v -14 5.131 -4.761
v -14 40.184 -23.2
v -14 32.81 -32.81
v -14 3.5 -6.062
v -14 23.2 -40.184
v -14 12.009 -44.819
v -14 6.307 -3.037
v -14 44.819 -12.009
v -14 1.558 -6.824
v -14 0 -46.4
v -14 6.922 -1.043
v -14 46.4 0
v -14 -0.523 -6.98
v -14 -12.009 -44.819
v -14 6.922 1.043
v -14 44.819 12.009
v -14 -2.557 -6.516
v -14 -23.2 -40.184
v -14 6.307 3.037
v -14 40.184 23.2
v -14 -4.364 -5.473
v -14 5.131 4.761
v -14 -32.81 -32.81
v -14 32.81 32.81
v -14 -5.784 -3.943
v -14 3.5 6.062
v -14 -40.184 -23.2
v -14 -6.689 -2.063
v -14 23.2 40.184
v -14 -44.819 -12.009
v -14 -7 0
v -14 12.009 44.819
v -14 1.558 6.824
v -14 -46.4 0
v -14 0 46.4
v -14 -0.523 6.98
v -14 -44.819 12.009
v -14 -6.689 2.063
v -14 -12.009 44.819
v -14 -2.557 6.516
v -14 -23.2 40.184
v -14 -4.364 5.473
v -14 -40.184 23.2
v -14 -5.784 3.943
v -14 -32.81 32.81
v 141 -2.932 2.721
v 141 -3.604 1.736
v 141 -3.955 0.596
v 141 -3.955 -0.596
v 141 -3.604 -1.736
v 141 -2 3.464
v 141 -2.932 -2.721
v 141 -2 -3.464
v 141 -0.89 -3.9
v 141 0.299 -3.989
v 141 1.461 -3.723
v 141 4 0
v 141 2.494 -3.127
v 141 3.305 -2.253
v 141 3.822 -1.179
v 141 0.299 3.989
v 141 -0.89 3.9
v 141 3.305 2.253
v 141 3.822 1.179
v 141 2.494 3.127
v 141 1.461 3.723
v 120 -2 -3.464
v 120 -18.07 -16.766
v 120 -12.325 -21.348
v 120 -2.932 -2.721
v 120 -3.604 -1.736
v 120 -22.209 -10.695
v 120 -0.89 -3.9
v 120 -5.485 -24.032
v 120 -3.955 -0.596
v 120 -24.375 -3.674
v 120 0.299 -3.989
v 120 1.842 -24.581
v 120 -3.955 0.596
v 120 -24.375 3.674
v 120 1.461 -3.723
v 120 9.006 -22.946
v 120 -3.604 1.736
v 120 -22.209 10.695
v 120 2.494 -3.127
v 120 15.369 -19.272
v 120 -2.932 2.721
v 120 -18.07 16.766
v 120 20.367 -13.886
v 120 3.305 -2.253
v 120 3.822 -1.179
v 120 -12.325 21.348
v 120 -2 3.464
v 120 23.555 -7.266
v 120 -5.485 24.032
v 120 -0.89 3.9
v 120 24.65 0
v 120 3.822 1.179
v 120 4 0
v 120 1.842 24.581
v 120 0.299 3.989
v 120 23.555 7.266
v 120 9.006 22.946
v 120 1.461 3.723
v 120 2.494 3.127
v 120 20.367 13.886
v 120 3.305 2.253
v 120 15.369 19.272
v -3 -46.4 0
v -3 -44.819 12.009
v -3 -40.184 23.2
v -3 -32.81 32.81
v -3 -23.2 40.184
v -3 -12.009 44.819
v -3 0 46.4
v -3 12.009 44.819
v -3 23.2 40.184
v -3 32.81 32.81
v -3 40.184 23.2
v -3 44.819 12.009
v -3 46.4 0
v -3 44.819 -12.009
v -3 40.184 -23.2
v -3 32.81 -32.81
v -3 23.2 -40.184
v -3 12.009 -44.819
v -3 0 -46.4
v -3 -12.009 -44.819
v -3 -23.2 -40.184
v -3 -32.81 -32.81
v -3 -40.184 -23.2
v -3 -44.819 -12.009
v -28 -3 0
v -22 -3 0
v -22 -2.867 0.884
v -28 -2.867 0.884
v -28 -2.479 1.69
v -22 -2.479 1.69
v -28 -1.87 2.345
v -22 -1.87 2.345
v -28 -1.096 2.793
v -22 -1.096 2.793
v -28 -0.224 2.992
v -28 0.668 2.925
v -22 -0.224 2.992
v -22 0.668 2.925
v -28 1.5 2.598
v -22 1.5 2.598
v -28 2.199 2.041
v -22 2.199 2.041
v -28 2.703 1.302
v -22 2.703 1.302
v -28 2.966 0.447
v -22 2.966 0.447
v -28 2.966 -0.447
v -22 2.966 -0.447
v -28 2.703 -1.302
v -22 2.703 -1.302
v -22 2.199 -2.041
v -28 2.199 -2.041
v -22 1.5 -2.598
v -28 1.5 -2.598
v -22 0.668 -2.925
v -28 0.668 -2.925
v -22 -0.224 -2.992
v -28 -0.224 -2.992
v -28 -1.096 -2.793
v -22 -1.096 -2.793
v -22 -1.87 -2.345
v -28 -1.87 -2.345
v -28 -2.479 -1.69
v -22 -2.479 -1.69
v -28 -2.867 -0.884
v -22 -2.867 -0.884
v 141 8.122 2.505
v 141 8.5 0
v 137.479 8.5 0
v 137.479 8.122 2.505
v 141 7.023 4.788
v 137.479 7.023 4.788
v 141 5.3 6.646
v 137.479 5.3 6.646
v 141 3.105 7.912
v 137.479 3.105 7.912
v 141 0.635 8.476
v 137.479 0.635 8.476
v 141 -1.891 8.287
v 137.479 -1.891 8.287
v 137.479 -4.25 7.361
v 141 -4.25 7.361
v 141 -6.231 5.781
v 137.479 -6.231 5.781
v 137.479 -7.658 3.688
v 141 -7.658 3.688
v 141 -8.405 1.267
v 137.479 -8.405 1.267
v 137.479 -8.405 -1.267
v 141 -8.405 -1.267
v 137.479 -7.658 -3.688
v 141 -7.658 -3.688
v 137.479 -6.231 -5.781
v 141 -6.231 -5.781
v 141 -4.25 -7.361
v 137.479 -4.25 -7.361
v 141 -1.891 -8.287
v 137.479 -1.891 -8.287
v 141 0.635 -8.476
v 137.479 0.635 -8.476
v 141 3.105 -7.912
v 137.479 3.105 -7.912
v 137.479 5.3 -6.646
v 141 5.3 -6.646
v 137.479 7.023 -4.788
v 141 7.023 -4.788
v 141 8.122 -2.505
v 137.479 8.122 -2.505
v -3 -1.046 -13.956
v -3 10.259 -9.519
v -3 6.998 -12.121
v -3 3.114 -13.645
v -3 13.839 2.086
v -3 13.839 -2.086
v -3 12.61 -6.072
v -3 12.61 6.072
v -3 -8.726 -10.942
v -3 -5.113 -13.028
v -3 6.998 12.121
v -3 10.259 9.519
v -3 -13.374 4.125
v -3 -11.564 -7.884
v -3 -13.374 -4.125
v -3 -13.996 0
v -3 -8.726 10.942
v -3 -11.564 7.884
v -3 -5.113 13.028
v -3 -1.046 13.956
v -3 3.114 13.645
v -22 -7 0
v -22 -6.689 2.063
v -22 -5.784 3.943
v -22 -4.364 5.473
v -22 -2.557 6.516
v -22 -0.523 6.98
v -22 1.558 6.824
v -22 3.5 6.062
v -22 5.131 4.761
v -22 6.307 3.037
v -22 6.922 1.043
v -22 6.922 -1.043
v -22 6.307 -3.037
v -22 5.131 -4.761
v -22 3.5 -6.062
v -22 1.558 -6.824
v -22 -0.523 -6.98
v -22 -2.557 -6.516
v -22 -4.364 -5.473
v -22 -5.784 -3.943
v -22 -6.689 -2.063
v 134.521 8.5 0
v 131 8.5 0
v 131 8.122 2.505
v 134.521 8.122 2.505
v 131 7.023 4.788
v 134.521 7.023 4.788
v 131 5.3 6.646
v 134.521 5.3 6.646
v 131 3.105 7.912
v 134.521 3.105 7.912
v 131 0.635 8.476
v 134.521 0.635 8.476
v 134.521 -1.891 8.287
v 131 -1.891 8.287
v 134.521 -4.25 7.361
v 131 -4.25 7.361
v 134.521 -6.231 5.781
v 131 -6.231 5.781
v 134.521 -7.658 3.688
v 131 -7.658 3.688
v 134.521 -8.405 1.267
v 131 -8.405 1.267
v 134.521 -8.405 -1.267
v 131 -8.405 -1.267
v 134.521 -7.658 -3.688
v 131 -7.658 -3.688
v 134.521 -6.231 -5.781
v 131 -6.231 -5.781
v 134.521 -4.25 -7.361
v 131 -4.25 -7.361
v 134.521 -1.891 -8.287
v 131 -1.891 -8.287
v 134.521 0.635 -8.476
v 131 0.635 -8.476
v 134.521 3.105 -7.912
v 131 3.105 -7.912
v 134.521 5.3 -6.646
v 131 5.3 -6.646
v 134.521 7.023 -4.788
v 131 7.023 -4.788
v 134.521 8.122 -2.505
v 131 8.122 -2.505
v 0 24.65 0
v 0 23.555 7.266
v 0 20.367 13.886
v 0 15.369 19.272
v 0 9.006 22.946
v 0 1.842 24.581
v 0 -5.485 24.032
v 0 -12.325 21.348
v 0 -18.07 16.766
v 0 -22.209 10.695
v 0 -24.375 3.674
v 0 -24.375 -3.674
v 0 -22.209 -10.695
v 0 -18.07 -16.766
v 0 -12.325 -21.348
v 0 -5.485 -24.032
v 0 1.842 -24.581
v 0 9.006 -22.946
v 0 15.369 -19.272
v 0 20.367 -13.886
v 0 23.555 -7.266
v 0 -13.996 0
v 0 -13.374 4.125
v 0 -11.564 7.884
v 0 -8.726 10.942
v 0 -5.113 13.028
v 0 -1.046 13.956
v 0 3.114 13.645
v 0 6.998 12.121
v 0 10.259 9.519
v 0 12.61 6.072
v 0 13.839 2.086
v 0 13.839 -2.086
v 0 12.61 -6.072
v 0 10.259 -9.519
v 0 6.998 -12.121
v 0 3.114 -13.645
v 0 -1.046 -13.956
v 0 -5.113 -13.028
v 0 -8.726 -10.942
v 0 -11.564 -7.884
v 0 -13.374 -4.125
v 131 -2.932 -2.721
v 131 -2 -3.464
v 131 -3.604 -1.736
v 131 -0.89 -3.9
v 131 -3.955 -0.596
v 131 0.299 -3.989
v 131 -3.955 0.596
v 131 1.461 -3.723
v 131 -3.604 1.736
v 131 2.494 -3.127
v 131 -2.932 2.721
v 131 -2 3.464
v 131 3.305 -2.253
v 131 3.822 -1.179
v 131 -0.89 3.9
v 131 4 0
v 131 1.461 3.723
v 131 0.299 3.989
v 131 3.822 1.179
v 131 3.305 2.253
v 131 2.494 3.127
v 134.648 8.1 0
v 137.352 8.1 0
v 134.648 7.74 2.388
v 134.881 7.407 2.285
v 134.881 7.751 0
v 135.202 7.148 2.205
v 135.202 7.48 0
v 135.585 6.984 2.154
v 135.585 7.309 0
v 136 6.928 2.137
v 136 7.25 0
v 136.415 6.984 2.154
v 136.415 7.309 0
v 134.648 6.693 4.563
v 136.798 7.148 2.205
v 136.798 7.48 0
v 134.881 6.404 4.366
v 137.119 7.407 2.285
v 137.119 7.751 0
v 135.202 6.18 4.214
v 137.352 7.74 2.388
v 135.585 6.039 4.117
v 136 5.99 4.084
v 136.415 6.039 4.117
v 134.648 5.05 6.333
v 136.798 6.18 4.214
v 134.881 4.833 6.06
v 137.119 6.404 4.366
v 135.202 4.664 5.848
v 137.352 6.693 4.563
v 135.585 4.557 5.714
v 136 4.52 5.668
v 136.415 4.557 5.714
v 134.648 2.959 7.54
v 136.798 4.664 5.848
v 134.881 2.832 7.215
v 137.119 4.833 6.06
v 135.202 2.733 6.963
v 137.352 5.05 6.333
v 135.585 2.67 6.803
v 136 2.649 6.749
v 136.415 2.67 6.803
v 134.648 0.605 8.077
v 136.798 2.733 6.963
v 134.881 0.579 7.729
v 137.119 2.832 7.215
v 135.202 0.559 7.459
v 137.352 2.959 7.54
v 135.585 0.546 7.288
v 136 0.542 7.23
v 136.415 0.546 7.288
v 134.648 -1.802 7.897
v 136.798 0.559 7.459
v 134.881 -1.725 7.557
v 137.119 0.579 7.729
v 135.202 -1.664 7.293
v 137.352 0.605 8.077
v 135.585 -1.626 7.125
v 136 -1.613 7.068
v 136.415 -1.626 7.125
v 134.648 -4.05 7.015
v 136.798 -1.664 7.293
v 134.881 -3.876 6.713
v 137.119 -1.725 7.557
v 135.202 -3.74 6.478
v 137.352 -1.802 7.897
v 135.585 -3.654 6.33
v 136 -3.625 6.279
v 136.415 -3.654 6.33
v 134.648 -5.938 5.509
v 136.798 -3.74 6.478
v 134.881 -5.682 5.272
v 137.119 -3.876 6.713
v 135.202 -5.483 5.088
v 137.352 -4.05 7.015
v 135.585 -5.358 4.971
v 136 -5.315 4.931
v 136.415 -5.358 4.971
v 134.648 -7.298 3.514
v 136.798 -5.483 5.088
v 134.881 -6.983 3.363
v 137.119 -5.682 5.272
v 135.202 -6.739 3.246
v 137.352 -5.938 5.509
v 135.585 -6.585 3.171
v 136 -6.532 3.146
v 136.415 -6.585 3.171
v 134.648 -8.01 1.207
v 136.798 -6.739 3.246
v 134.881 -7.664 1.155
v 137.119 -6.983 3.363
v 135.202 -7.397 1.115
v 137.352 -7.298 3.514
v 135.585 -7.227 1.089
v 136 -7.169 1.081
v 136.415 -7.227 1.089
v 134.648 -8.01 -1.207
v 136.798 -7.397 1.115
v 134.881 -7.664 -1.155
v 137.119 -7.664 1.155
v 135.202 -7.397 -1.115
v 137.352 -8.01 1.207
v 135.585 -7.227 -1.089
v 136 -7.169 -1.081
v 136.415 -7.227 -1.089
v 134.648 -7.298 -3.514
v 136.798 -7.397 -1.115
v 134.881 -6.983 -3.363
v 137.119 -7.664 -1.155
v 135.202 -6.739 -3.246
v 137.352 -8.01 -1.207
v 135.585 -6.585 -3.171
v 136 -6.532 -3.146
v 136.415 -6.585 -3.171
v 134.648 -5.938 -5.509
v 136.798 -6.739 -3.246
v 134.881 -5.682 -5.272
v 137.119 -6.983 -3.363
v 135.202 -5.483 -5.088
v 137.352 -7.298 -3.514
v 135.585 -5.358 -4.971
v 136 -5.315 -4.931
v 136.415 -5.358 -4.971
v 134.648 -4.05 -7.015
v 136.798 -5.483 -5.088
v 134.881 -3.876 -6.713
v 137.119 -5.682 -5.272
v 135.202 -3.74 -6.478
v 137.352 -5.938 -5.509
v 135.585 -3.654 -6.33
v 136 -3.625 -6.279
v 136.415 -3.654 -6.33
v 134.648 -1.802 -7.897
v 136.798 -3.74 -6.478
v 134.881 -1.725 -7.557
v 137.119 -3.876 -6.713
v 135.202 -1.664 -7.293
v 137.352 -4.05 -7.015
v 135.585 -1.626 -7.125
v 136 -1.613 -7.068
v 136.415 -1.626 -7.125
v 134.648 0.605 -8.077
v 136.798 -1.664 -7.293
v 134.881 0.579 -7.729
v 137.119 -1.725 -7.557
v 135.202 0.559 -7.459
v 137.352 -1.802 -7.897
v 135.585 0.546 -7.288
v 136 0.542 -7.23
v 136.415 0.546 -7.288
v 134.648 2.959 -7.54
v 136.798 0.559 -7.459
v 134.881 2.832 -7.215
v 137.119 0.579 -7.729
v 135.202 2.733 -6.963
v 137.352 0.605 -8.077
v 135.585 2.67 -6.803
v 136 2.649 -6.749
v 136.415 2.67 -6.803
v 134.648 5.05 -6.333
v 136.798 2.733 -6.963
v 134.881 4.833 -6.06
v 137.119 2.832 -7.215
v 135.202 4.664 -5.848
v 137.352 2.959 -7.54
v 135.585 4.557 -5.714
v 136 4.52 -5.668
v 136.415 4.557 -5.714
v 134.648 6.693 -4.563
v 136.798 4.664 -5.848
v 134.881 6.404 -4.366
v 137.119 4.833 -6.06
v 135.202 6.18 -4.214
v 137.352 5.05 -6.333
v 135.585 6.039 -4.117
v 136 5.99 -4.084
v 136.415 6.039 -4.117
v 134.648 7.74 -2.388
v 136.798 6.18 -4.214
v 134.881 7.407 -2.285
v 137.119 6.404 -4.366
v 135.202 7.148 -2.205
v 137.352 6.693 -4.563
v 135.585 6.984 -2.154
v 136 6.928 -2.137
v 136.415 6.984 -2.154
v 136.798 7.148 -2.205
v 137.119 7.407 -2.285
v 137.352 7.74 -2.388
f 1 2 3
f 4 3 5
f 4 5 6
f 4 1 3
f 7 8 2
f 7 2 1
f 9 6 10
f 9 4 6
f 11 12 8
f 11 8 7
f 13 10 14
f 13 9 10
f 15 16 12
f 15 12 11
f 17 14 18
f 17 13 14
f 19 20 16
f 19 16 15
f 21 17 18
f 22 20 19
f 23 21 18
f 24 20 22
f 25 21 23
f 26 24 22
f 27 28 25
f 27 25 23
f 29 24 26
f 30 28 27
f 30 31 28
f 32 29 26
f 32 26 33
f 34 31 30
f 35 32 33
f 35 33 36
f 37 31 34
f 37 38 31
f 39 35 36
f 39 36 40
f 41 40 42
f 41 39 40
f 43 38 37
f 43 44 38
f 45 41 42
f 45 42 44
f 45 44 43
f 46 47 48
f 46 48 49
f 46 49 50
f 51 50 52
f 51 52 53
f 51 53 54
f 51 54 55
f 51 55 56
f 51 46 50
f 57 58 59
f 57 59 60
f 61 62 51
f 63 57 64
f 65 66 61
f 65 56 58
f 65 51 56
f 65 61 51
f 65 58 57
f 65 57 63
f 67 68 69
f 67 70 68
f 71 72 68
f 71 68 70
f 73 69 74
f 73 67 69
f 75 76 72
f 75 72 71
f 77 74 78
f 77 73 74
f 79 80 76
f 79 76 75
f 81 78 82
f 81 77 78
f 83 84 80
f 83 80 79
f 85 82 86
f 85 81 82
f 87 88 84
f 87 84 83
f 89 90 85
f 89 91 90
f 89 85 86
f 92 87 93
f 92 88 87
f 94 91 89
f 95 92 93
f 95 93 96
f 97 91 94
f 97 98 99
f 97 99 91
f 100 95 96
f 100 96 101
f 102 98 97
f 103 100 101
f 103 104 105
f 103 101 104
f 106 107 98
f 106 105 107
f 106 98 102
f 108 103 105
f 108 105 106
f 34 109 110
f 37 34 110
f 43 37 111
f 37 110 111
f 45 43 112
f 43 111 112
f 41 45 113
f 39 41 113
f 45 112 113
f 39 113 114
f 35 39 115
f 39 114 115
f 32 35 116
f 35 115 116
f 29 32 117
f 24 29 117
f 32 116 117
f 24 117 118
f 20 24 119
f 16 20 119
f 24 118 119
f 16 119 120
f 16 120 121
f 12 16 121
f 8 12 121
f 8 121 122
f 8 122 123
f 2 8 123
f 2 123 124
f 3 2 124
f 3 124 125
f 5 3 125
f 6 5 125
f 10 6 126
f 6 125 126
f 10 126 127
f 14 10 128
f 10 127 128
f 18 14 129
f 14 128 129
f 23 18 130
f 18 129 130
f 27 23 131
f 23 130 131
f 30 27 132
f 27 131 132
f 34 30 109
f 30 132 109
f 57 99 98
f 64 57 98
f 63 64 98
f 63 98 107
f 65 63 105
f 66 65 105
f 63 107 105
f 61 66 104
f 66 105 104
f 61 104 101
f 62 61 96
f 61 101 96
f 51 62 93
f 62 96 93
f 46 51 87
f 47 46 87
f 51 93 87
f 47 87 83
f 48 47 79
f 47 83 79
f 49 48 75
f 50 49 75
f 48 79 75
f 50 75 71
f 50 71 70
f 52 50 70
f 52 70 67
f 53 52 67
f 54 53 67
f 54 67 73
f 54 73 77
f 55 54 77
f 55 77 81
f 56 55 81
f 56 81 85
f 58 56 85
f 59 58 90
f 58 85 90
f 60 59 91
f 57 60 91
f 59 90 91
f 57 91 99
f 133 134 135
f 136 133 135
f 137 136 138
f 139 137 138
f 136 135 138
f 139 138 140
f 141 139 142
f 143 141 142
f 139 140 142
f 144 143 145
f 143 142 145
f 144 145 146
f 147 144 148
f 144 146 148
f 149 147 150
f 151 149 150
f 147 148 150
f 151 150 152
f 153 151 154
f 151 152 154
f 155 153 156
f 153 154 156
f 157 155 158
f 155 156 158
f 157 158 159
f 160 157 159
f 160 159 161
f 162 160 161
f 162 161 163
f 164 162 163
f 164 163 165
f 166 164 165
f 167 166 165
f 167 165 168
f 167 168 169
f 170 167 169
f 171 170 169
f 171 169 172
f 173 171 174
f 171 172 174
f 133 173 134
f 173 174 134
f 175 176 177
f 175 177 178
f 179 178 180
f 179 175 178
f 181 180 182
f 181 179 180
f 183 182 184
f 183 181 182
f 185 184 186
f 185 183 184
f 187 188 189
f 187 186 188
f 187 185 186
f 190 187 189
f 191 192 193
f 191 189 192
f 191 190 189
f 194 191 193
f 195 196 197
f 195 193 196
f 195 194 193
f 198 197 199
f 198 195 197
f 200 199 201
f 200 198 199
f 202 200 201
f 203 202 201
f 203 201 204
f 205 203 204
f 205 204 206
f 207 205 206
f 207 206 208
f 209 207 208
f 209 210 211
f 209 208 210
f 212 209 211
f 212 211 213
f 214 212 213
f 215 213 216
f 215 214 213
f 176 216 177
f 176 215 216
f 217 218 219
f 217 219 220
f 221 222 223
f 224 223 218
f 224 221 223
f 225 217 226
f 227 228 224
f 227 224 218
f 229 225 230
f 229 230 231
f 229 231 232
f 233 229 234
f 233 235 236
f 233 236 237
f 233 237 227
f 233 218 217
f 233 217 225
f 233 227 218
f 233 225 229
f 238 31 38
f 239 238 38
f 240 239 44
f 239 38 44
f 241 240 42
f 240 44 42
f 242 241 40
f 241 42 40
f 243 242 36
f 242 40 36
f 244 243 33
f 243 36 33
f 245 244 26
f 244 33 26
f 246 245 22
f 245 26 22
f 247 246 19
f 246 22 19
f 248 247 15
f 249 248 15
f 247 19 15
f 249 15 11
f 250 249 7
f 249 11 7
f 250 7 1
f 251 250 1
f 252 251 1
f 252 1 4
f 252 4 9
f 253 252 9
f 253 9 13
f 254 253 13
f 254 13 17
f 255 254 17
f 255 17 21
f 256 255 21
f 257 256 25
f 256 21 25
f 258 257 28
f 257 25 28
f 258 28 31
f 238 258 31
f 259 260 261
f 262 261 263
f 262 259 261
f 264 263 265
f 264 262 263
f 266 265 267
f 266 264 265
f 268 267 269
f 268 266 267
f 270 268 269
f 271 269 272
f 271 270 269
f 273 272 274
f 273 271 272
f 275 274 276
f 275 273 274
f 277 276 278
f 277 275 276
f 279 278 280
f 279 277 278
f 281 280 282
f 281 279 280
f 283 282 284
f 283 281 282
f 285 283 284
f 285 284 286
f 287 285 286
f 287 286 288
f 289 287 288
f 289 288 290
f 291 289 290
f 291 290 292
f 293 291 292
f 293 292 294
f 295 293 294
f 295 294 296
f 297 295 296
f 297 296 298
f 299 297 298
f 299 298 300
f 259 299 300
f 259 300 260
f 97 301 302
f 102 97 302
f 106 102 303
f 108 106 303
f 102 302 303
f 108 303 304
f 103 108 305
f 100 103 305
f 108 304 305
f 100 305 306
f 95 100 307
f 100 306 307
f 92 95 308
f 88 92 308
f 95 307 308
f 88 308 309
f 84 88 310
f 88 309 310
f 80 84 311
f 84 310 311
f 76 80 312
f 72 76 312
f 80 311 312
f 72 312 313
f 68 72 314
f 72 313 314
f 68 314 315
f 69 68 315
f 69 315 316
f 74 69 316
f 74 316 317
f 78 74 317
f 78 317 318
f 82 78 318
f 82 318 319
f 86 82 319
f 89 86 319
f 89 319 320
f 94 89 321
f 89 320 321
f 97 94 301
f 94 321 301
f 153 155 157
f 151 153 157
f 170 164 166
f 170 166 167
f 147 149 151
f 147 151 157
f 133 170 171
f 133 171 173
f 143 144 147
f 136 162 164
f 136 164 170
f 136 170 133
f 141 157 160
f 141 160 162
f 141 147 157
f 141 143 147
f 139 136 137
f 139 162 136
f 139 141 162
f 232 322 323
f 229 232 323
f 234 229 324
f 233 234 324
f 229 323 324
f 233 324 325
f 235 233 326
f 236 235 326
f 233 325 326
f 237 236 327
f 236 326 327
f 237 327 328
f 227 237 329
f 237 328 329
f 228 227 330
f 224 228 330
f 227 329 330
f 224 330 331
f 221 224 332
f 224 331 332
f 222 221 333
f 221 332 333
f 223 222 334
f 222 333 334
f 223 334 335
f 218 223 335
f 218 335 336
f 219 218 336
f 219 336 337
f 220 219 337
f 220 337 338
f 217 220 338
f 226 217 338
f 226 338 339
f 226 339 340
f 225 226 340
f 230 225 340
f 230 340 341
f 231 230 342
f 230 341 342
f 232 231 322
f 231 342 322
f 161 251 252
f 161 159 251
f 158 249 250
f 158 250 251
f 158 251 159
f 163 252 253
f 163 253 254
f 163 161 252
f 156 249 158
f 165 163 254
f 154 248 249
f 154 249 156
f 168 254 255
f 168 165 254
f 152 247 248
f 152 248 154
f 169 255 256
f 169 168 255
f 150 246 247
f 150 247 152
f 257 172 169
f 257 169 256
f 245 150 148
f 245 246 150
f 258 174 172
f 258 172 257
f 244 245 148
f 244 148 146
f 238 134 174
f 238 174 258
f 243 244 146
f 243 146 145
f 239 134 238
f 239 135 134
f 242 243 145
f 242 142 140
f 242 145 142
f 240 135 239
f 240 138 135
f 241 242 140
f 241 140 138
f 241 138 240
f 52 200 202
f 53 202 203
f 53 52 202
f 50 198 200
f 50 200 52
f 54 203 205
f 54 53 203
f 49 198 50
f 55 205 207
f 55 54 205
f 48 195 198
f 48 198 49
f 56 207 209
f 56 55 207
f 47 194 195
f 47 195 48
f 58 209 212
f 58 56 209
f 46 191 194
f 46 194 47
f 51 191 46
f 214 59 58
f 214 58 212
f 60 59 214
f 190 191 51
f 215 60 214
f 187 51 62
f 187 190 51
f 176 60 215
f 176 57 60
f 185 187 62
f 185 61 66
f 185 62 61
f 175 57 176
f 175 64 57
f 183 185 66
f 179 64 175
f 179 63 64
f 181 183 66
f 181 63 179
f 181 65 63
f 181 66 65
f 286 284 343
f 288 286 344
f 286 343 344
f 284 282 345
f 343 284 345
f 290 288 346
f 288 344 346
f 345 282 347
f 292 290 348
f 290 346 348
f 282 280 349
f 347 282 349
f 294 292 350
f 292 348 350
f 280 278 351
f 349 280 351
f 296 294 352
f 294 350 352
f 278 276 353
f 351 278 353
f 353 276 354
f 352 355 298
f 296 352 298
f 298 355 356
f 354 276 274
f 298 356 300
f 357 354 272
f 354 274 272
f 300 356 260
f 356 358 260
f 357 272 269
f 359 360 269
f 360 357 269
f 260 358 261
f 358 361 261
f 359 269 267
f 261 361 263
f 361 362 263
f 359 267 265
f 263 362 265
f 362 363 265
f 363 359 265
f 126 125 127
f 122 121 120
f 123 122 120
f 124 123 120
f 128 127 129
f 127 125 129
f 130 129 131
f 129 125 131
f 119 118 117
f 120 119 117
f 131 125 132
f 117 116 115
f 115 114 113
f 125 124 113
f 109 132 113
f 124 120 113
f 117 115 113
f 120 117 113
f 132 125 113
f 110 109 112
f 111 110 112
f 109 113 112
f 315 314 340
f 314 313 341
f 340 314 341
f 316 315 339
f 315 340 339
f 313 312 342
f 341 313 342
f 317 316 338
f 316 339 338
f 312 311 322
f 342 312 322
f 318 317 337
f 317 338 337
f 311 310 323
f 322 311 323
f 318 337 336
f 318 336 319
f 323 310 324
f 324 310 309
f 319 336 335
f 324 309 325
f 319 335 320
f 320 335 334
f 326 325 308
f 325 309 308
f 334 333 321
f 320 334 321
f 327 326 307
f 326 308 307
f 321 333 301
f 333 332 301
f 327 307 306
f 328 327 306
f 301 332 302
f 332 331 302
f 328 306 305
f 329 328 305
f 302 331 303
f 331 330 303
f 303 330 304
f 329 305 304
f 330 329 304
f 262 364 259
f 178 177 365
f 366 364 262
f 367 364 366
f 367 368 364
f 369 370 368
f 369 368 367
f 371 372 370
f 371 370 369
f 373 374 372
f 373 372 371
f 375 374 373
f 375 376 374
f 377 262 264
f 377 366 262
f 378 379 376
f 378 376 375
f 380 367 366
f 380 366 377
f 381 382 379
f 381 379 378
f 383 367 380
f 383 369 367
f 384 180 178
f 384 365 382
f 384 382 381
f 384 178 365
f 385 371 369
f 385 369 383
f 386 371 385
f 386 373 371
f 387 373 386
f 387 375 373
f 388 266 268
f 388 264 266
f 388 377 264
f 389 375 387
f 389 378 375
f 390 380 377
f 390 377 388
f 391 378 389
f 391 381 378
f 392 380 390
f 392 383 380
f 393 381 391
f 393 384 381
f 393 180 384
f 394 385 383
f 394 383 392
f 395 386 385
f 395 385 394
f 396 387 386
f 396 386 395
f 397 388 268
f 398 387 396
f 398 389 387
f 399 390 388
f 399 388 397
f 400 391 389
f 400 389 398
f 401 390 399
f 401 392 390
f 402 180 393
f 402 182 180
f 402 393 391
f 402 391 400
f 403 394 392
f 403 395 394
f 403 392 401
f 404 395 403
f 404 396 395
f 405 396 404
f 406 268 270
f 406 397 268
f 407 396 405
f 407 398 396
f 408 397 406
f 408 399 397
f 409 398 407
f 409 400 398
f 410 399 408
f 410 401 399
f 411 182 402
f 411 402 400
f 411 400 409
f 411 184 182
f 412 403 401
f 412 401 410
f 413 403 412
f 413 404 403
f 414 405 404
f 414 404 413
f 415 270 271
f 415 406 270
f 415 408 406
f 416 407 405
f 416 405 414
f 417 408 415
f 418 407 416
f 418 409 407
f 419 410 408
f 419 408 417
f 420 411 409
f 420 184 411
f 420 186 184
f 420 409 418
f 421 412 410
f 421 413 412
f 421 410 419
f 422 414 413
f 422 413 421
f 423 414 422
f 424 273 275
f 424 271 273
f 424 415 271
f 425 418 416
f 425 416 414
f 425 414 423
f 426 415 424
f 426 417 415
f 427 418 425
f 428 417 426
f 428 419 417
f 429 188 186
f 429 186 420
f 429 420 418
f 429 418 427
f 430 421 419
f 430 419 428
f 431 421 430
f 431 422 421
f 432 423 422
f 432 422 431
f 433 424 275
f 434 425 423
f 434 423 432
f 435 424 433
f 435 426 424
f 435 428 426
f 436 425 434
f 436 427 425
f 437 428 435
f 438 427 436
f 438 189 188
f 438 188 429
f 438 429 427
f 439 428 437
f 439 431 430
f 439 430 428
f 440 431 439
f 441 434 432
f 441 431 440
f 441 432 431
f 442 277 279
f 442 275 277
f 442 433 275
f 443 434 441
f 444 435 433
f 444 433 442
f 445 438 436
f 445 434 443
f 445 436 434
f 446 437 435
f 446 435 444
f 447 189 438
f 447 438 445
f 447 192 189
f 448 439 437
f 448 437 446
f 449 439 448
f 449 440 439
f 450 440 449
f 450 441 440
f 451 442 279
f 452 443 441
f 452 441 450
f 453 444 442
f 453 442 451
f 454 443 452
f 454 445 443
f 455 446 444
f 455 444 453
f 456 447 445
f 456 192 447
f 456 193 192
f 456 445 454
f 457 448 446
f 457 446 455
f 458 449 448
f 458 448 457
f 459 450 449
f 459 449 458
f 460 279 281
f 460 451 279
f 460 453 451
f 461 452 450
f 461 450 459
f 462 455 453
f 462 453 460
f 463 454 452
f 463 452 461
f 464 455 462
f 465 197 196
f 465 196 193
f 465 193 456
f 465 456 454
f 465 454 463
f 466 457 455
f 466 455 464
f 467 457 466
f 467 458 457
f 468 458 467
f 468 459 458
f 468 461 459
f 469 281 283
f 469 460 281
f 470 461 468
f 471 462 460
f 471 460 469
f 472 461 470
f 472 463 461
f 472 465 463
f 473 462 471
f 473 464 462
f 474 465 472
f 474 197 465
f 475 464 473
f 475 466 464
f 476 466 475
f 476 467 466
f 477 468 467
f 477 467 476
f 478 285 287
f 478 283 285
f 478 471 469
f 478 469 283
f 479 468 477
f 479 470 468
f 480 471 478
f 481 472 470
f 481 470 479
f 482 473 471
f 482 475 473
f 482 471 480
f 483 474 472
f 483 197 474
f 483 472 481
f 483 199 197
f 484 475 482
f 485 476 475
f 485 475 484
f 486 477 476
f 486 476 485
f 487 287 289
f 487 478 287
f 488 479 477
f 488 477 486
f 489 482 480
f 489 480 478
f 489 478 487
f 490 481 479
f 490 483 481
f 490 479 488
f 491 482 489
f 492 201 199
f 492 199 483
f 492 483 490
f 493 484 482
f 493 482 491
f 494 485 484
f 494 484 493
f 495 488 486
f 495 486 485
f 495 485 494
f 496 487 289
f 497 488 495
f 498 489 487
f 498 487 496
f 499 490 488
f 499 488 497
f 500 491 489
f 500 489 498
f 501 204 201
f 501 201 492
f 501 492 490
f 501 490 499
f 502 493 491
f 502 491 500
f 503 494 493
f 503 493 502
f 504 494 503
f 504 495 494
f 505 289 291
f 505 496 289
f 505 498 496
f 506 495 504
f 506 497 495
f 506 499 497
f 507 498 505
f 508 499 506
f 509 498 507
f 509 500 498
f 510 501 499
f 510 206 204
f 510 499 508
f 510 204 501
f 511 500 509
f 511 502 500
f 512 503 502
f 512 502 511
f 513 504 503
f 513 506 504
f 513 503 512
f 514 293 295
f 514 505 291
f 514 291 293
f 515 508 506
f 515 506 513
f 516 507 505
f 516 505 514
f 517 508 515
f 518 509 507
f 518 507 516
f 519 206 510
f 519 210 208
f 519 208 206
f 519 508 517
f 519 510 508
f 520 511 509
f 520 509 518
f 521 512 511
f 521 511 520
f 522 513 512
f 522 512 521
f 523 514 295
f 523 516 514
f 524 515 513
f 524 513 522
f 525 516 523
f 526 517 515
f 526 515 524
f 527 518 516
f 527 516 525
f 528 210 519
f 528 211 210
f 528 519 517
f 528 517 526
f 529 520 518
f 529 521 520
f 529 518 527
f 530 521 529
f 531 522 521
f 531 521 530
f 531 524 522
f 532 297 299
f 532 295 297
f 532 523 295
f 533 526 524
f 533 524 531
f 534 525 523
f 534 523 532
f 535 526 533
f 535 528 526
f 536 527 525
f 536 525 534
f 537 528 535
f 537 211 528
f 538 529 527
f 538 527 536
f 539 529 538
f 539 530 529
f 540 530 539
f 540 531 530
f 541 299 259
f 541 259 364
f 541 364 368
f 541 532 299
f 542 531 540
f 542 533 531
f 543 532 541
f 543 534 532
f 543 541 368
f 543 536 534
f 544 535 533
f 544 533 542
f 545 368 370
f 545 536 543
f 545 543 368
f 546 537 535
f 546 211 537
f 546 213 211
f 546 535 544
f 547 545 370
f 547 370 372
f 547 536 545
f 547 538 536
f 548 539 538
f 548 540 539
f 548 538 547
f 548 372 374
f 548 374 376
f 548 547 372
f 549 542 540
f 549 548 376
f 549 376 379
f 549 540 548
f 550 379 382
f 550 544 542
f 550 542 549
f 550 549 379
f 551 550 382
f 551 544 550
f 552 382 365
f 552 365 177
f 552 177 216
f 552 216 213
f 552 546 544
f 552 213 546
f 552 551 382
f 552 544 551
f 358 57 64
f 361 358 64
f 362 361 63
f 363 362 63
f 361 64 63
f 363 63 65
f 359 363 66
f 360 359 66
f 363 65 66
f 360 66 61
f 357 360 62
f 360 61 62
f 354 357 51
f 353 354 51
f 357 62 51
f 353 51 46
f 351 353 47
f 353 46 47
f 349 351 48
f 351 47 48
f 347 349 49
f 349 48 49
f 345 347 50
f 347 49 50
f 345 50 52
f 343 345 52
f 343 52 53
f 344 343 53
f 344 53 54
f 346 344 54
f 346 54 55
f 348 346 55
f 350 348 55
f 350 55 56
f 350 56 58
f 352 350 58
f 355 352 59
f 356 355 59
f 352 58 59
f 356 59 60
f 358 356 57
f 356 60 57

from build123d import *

# Parameters (mm, degrees)
F0_R      = 24.65
F1_DEPTH  = 120
F2_R      = 4
F3_DEPTH  = 21
F4_R      = 13.995559
F5_DEPTH  = 3
F6_R      = 46.4
F6_R_2    = 13.995559
F7_DEPTH  = 11
F8_R      = 7
F9_DEPTH  = 8
F10_R     = 3
F11_DEPTH = 6
F12_R     = 8.5
F12_R_2   = 4
F13_DEPTH = 10
F15_R     = 1.5


with BuildPart() as f1:
    # F0 (on Right) → F1 (new body)
    with BuildSketch(Plane.YZ):
        Circle(F0_R)
    extrude(amount=F1_DEPTH)

    # F2 (on face) → F3 (join)
    with BuildSketch(Plane.YZ.offset(120)):
        Circle(F2_R)
    extrude(amount=F3_DEPTH)

    # F4 (on face) → F5 (join)
    with BuildSketch(Plane(origin=(0, 0, 0), x_dir=(0, -1, 0), z_dir=(-1, 0, 0))):
        Circle(F4_R)
    extrude(amount=F5_DEPTH)


with BuildPart() as f7:
    # F6 (on face) → F7 (new body)
    with BuildSketch(Plane(origin=(-3, 0, 0), x_dir=(0, -1, 0), z_dir=(-1, 0, 0))):
        Circle(F6_R)
        Circle(F6_R_2, mode=Mode.SUBTRACT)
        Circle(F6_R_2)
    extrude(amount=F7_DEPTH)

    # F8 (on face) → F9 (join)
    with BuildSketch(Plane(origin=(-14, 0, 0), x_dir=(0, -1, 0), z_dir=(-1, 0, 0))):
        Circle(F8_R)
    extrude(amount=F9_DEPTH)

    # F10 (on face) → F11 (join)
    with BuildSketch(Plane(origin=(-22, 0, 0), x_dir=(0, -1, 0), z_dir=(-1, 0, 0))):
        Circle(F10_R)
    extrude(amount=F11_DEPTH)


with BuildPart() as f13:
    # F12 (on face) → F13 (new body)
    with BuildSketch(Plane.YZ.offset(141)):
        Circle(F12_R)
        Circle(F12_R_2, mode=Mode.SUBTRACT)
    extrude(amount=-F13_DEPTH)

    # F15 (on Top) → F16 (revolve, cut)
    with BuildSketch(Plane.XY):
        with Locations((136, 8.75)):
            Circle(F15_R)
    revolve(axis=Axis((251.482069, 0, 0), (1, 0, 0)), mode=Mode.SUBTRACT)


solid = Compound([f1.part, f7.part, f13.part])
